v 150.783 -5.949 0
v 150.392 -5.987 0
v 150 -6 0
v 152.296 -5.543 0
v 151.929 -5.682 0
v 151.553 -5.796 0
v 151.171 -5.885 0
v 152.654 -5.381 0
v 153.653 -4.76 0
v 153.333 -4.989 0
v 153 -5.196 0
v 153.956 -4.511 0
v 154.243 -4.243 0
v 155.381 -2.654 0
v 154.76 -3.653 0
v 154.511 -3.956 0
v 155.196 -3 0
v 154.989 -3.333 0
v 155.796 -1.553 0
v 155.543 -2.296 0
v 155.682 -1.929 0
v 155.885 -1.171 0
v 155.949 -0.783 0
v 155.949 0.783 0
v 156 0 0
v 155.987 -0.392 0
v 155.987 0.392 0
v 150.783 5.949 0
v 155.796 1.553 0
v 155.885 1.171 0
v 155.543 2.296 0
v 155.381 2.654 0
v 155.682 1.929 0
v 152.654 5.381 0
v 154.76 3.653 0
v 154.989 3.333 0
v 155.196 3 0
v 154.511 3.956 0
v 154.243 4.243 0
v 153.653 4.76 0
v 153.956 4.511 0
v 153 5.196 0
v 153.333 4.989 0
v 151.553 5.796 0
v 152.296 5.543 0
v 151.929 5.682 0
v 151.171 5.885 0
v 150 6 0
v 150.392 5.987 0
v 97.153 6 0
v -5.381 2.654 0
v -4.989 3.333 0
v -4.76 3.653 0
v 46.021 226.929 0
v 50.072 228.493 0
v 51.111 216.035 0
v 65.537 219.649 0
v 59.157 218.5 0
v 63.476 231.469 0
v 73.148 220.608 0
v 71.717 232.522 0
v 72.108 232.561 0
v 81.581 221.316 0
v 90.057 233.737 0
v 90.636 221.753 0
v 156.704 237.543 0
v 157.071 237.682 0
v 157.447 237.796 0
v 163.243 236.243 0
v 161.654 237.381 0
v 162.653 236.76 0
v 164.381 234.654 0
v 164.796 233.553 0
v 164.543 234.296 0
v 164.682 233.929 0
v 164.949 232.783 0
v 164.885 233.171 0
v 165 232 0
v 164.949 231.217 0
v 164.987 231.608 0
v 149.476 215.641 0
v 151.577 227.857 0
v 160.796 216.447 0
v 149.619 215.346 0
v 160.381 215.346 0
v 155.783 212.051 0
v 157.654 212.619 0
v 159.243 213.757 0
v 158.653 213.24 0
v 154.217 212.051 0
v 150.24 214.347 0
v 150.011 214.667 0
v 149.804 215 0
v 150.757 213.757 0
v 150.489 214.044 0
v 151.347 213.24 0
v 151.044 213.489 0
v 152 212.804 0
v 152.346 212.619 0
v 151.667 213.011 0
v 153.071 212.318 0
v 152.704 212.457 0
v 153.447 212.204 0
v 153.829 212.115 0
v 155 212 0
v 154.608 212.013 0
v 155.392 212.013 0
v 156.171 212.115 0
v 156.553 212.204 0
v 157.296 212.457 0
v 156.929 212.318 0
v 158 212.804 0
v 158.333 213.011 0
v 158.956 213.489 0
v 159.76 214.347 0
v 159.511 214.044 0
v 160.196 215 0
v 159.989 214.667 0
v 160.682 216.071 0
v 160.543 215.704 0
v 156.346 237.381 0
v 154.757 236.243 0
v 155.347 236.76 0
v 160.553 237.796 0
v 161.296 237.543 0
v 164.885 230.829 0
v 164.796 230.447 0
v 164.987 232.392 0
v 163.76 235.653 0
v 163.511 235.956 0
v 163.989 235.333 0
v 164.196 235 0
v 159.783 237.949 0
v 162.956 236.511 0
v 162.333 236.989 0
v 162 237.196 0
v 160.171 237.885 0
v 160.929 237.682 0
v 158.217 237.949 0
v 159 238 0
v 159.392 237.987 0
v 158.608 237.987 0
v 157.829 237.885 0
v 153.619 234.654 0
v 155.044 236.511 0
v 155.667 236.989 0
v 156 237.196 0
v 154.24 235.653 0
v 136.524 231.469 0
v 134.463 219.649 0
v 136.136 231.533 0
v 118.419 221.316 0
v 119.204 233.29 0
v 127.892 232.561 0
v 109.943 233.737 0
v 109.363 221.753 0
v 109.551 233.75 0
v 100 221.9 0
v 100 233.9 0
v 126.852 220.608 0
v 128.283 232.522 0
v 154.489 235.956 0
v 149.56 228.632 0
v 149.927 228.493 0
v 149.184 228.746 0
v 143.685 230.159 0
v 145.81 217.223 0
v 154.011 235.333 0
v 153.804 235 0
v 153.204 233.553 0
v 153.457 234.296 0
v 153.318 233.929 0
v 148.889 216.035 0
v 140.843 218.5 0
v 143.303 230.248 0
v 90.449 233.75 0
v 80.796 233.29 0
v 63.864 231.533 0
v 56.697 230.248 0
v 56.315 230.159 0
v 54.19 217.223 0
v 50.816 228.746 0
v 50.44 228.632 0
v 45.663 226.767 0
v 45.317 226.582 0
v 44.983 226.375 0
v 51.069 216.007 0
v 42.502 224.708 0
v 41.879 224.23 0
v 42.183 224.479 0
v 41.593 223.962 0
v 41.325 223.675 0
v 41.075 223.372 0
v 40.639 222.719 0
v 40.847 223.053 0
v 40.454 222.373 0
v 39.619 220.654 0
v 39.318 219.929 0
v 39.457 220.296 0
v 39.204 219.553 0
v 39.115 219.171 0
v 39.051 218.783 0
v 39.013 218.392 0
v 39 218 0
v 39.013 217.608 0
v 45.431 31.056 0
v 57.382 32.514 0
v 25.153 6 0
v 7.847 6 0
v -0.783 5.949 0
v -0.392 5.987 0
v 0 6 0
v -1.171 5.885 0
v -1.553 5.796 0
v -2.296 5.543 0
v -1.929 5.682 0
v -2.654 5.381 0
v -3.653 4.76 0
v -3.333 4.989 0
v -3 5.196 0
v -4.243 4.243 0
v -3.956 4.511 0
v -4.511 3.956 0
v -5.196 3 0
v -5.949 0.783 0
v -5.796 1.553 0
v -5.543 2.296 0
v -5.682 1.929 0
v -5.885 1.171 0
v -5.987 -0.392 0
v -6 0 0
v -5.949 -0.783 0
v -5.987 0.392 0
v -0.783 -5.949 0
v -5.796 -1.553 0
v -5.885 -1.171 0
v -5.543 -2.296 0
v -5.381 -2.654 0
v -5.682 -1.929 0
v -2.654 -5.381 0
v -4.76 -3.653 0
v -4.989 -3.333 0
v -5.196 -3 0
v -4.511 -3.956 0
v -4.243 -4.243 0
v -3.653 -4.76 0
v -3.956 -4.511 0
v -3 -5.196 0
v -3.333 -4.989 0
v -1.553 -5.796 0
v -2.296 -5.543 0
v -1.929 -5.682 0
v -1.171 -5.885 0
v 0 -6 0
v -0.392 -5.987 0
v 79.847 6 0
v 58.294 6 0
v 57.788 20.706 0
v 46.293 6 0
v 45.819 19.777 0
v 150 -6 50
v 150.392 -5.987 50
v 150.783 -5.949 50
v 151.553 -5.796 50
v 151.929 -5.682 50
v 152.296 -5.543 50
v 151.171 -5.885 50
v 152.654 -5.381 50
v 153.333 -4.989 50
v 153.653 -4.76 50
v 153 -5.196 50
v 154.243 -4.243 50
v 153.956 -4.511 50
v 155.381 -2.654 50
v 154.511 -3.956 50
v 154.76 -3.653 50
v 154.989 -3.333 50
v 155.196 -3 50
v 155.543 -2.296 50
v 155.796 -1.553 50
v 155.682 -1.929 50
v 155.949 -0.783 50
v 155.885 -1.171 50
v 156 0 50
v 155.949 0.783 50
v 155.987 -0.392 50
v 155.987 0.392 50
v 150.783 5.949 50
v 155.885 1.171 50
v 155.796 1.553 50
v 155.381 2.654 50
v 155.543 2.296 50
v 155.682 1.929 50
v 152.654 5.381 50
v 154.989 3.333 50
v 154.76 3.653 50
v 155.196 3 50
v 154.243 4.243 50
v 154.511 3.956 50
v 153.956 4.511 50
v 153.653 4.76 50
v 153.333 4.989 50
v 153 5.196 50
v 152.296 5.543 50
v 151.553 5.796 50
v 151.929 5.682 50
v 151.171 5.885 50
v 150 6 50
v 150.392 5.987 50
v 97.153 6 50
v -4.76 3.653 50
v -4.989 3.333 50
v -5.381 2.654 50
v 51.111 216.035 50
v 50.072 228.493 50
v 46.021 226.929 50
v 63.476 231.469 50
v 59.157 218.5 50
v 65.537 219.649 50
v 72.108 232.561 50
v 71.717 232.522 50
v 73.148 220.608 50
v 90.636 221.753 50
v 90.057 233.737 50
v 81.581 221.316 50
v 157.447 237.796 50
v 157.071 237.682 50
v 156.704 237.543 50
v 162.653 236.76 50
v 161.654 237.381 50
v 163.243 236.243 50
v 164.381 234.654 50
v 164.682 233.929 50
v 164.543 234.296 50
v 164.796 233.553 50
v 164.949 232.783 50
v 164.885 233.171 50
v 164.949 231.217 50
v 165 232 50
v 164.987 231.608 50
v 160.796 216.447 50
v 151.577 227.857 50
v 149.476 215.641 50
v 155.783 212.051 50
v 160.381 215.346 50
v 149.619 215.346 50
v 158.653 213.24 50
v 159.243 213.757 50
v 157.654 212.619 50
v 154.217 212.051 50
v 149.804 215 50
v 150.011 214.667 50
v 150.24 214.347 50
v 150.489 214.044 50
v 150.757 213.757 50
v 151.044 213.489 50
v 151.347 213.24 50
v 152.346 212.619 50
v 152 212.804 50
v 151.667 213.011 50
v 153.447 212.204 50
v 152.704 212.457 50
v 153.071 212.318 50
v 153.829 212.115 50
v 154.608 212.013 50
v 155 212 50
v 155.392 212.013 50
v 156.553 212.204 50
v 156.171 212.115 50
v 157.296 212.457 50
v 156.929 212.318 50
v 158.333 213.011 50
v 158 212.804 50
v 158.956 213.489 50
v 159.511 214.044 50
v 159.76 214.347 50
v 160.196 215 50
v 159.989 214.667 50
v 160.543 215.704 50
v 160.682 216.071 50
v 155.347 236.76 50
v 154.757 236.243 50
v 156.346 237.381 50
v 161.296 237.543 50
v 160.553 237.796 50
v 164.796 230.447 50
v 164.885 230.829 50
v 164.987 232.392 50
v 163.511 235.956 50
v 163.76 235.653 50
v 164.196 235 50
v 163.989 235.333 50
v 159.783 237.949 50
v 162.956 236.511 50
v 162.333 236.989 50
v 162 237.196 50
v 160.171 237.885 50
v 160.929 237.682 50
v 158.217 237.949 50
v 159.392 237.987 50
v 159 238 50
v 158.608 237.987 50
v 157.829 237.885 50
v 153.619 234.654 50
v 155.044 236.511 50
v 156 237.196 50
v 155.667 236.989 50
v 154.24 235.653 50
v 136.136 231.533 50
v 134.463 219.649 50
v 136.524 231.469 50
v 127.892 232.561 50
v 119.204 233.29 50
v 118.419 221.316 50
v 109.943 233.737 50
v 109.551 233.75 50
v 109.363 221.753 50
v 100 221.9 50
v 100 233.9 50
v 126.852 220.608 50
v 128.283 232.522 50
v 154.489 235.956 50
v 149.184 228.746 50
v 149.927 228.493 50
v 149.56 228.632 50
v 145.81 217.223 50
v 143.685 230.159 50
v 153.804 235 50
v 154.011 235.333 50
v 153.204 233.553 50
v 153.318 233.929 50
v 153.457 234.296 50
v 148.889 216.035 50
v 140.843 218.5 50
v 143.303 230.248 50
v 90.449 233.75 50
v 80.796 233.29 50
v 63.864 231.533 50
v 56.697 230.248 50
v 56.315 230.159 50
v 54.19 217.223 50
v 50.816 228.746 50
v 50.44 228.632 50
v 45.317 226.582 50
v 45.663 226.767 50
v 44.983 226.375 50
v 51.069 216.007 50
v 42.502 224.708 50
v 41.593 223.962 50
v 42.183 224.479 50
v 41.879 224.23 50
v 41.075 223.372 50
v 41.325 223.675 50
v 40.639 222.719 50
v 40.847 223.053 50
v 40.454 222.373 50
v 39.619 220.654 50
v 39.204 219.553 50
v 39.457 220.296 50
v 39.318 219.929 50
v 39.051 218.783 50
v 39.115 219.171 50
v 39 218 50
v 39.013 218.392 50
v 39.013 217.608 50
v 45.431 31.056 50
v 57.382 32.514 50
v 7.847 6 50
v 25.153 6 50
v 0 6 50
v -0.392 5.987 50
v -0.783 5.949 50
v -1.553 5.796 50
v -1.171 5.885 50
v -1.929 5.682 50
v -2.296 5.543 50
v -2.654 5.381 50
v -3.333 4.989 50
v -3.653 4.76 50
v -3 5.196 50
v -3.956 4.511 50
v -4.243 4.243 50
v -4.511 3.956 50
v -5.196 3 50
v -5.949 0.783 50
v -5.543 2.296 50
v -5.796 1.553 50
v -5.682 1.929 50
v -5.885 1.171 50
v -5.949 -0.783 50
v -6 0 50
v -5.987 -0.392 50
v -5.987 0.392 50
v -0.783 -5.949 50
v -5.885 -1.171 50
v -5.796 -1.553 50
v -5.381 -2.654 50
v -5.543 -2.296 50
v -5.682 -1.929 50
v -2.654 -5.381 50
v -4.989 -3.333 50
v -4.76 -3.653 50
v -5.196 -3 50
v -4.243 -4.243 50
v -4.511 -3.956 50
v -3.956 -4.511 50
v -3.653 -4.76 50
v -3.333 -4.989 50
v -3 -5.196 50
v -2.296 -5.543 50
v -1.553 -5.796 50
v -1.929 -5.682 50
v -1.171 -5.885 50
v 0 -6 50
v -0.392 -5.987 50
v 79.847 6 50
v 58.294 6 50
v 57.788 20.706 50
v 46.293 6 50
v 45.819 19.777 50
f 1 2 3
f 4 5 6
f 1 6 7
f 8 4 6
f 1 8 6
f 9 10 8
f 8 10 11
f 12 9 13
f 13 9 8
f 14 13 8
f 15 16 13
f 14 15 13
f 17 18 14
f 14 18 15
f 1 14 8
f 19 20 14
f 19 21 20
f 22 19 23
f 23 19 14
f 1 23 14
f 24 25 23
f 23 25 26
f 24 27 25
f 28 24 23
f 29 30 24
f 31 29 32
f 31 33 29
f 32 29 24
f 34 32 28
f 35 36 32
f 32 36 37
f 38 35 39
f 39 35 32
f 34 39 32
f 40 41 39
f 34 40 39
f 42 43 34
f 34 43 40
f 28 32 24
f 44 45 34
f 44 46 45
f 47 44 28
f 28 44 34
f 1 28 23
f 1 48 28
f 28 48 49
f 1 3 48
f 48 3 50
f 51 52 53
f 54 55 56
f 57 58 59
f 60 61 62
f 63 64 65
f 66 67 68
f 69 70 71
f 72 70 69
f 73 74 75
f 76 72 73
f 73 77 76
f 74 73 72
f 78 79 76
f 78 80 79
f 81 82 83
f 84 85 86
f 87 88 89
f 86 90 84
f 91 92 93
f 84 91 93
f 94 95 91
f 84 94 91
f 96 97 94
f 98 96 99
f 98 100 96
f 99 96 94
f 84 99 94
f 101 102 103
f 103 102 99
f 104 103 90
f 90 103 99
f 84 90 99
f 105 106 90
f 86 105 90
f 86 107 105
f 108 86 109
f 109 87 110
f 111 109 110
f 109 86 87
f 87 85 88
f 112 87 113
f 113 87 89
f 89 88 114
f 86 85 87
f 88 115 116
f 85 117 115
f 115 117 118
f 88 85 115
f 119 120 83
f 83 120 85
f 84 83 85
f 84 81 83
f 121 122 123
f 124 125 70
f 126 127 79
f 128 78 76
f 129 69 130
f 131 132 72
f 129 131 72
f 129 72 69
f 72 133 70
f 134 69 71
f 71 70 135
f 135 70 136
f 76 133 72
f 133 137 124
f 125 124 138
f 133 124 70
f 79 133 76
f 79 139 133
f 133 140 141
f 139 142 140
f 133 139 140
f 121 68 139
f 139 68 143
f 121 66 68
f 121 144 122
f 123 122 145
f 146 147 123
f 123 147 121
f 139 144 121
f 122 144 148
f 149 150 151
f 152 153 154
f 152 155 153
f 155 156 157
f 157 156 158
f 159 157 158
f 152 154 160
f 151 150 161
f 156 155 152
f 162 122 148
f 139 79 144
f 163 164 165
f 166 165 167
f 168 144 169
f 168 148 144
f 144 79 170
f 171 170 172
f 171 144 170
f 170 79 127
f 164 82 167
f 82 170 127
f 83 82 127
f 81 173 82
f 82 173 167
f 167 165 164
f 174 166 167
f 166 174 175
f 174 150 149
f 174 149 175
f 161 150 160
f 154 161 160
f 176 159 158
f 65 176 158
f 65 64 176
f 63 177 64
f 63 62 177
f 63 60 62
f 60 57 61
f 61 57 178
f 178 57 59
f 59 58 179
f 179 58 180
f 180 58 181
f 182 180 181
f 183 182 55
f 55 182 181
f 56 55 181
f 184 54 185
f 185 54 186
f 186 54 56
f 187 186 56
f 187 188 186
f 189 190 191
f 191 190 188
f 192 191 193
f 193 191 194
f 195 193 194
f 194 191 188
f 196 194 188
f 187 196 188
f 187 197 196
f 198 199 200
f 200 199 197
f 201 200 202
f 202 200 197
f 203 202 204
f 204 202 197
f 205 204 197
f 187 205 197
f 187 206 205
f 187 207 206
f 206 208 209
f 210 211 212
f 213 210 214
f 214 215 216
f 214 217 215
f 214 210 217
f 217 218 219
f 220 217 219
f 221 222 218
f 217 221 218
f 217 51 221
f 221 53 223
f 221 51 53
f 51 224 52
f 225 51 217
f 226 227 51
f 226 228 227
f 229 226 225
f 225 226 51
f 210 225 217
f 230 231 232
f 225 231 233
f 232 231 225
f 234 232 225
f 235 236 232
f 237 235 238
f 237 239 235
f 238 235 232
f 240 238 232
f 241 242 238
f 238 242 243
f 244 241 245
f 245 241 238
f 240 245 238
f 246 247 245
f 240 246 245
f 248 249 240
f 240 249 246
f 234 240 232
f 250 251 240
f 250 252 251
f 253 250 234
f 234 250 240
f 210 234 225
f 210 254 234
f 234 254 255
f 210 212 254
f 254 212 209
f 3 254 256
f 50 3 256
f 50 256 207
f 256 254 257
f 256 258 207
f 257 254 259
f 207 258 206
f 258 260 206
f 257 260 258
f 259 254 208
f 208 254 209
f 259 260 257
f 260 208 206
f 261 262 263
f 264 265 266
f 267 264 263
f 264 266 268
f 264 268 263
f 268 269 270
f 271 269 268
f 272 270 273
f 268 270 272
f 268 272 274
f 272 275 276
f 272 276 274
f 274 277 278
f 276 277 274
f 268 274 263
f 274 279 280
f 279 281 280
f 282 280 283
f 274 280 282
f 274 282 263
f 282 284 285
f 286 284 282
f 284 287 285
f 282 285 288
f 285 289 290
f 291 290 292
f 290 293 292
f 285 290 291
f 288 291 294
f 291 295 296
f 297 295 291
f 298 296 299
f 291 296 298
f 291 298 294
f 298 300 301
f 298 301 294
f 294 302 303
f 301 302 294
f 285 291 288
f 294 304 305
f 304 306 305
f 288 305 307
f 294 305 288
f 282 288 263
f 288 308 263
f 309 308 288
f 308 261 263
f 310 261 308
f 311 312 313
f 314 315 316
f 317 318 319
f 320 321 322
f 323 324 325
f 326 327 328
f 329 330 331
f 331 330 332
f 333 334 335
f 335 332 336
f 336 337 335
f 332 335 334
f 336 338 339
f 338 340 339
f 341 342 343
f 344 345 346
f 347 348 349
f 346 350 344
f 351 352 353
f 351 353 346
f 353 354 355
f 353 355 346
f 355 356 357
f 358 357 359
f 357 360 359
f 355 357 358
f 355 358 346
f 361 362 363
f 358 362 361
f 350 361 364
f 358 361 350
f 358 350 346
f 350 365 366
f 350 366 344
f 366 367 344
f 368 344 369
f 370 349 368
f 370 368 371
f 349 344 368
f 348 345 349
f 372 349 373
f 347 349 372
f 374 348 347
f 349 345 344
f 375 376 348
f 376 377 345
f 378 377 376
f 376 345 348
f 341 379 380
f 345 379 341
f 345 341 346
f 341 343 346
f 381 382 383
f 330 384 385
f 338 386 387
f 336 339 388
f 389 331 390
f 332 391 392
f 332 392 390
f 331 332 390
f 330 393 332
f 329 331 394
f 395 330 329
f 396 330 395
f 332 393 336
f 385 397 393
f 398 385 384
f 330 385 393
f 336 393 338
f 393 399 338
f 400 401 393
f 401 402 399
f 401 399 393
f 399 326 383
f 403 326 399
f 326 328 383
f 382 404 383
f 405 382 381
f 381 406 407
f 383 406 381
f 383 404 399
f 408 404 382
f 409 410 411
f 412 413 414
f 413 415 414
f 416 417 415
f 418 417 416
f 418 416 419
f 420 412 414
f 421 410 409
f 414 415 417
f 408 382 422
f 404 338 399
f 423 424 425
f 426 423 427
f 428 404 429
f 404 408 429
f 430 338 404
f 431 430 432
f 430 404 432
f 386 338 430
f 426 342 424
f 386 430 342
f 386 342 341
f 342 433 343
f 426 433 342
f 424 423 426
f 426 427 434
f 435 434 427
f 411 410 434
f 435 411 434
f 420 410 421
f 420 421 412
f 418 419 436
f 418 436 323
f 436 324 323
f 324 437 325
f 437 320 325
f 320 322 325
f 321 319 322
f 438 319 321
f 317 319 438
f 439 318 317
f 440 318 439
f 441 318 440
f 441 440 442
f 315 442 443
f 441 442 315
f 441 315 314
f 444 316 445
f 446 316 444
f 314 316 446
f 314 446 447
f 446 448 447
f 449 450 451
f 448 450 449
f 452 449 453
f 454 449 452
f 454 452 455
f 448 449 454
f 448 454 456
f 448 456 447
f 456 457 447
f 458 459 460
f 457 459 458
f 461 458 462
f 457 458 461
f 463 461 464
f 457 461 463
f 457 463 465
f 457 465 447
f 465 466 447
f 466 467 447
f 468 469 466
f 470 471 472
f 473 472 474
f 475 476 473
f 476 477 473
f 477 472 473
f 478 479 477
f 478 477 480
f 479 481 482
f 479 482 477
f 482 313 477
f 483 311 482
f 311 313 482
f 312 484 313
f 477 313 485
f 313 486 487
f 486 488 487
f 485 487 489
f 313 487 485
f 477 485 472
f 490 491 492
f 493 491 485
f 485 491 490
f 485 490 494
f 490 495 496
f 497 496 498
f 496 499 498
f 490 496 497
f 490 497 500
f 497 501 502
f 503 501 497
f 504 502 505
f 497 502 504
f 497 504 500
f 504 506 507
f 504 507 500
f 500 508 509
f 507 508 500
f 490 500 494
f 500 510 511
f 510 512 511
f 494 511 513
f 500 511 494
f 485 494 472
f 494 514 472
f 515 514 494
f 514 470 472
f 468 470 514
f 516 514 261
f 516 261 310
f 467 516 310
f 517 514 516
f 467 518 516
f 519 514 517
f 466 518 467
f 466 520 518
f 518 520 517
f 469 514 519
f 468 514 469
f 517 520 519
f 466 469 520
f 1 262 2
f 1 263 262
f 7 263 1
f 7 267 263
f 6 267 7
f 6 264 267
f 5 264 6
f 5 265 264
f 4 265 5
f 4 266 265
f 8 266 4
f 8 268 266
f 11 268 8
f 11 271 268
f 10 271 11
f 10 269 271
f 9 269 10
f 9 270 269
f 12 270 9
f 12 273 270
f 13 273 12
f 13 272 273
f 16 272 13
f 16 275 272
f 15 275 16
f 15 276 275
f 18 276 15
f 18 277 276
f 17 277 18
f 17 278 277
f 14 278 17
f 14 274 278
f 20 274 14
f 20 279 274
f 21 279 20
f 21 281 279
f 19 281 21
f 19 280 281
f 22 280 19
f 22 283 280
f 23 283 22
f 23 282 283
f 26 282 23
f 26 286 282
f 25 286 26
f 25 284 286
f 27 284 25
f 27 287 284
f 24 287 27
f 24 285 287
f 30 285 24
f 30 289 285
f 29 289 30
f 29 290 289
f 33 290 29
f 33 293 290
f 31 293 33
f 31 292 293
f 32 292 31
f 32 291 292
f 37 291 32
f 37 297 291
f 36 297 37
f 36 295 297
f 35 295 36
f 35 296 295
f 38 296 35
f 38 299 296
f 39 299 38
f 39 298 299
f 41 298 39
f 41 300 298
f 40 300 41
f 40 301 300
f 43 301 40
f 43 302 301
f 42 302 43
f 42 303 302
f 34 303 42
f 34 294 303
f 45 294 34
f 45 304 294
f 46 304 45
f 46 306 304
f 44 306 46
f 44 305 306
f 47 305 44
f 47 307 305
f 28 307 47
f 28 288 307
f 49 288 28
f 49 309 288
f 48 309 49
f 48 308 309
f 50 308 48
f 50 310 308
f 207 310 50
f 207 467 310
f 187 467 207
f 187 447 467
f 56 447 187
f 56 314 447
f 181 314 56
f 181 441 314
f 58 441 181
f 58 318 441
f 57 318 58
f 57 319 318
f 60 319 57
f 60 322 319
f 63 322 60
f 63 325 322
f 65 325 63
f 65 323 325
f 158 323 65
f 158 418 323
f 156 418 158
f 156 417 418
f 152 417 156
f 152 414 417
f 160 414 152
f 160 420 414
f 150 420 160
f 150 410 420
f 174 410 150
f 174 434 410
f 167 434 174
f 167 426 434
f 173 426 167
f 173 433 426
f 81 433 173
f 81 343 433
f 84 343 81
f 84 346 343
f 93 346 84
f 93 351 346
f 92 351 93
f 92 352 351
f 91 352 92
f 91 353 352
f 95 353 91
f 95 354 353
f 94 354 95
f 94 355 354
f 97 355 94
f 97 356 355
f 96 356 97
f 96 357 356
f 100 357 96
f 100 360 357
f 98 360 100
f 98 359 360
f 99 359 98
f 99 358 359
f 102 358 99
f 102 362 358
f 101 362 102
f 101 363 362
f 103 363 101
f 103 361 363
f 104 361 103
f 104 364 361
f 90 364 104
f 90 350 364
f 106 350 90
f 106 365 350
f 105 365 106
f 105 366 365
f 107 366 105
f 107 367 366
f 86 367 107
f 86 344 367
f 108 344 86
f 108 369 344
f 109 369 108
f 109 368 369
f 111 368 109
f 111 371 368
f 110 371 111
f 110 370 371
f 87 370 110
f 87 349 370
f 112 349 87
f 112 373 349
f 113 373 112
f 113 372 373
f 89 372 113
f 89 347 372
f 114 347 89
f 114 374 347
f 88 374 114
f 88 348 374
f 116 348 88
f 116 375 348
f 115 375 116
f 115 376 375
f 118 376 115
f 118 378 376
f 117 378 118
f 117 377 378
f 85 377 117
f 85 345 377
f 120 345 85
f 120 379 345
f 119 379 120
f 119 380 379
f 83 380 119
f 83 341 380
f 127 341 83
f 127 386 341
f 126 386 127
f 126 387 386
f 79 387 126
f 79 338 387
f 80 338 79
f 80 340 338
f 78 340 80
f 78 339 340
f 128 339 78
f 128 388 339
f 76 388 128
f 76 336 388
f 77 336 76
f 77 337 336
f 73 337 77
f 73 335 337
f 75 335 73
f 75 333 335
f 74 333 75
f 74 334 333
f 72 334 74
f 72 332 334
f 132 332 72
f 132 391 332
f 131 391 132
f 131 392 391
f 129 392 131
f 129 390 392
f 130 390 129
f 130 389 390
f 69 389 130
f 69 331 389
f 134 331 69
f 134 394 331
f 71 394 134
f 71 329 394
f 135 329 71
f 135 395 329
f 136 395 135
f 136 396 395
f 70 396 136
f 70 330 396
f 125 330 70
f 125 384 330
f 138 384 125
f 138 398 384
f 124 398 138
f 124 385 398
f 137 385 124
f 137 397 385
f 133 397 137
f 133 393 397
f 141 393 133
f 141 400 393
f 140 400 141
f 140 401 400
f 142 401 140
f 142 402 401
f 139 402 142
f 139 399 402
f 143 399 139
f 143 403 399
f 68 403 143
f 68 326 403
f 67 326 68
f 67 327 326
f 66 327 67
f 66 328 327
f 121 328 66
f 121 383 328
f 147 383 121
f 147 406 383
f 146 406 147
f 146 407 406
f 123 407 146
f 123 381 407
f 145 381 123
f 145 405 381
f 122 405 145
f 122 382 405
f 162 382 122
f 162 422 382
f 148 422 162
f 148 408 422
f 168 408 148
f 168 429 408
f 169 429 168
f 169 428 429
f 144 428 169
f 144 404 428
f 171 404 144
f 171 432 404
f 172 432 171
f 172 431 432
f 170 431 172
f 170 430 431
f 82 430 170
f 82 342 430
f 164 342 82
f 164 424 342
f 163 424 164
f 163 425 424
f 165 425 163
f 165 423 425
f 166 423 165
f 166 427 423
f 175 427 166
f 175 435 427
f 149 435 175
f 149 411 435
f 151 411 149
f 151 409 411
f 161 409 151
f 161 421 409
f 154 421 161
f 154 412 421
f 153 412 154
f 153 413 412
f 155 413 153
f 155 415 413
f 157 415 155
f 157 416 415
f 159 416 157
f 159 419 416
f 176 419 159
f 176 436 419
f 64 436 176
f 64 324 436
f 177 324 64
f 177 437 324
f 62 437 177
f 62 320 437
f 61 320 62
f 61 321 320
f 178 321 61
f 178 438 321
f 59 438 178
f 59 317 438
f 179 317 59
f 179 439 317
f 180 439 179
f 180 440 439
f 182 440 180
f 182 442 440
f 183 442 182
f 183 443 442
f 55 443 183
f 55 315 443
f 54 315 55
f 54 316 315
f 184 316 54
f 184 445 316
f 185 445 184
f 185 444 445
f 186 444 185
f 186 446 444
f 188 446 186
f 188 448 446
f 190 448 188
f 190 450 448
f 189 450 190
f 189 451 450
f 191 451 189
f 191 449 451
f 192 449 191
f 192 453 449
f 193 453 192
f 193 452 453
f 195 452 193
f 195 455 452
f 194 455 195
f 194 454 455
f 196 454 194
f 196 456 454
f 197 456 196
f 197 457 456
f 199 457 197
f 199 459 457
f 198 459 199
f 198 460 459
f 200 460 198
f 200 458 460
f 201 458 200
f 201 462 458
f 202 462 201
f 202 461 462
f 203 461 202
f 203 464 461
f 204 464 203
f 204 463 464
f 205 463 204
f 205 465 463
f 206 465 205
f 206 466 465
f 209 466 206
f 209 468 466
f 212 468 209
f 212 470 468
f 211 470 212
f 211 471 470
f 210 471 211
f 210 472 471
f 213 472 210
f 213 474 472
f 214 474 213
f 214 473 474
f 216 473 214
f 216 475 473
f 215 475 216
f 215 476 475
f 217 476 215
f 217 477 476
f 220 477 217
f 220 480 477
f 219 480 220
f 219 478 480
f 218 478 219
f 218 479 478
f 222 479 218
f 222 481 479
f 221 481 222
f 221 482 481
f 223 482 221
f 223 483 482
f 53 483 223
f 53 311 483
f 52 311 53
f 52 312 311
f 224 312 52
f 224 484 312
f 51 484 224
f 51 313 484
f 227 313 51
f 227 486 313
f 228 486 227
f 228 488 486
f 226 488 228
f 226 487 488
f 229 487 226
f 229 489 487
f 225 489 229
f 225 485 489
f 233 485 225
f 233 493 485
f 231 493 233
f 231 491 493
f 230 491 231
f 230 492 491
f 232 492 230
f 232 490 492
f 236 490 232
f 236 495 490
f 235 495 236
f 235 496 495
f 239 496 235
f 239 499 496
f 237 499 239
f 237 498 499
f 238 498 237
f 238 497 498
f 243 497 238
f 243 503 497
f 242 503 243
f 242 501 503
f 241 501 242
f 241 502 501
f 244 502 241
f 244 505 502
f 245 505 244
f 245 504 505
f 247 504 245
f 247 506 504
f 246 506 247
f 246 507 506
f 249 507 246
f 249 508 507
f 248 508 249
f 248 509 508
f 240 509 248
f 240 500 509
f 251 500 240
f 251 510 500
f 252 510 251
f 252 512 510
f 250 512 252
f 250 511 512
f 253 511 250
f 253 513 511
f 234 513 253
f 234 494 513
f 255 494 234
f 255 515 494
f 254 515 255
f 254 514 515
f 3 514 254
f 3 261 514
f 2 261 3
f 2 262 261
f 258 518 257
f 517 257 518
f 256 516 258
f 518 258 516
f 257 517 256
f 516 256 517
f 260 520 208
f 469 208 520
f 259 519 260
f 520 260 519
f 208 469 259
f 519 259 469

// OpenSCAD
// Minimal Headphone Stand - original parametric design (Brian Sacco)
// Printed lying flat (2D profile extruded) -> no supports, strong layer lines.
height      = 230;   // hanger height (mm). Over-ear headphones measure ~185-220 mm tall
                     // (AirPods Max 187 mm): 230 keeps the cups off the desk; 195 = compact for 220 mm beds
base_len    = 150;   // footprint length (mm)
arm_len     = 110;   // top hanger length (mm)
thick       = 12;    // profile stroke thickness (mm)
extrude     = 50;    // print height = stand width (mm)
lip         = 14;    // raised lip at end of hanger
$fn = 96;

module stroke(p1, p2, t=thick) { hull() { translate(p1) circle(d=t); translate(p2) circle(d=t); } }

module profile() {
    // base
    stroke([0,0],[base_len,0]);
    // upright slightly leaning back for balance
    stroke([base_len*0.35,0],[base_len*0.30,height - thick]);
    // hanger (curved saddle)
    for (a=[0:10:170]) {
        r = arm_len/2;
        c = [base_len*0.30 + r, height - thick];
        p1 = c + [ -r*cos(a),     r*0.18*sin(a)];
        p2 = c + [ -r*cos(a+10),  r*0.18*sin(a+10)];
        stroke(p1, p2);
    }
    // lip
    stroke([base_len*0.30 + arm_len, height - thick],[base_len*0.30 + arm_len + 4, height - thick + lip]);
    // gusset for rigidity
    stroke([base_len*0.35,thick*2.5],[base_len*0.65,0], thick*0.8);
    stroke([base_len*0.35,thick*2.5],[base_len*0.05,0], thick*0.8);
}
linear_extrude(height = extrude) profile();
